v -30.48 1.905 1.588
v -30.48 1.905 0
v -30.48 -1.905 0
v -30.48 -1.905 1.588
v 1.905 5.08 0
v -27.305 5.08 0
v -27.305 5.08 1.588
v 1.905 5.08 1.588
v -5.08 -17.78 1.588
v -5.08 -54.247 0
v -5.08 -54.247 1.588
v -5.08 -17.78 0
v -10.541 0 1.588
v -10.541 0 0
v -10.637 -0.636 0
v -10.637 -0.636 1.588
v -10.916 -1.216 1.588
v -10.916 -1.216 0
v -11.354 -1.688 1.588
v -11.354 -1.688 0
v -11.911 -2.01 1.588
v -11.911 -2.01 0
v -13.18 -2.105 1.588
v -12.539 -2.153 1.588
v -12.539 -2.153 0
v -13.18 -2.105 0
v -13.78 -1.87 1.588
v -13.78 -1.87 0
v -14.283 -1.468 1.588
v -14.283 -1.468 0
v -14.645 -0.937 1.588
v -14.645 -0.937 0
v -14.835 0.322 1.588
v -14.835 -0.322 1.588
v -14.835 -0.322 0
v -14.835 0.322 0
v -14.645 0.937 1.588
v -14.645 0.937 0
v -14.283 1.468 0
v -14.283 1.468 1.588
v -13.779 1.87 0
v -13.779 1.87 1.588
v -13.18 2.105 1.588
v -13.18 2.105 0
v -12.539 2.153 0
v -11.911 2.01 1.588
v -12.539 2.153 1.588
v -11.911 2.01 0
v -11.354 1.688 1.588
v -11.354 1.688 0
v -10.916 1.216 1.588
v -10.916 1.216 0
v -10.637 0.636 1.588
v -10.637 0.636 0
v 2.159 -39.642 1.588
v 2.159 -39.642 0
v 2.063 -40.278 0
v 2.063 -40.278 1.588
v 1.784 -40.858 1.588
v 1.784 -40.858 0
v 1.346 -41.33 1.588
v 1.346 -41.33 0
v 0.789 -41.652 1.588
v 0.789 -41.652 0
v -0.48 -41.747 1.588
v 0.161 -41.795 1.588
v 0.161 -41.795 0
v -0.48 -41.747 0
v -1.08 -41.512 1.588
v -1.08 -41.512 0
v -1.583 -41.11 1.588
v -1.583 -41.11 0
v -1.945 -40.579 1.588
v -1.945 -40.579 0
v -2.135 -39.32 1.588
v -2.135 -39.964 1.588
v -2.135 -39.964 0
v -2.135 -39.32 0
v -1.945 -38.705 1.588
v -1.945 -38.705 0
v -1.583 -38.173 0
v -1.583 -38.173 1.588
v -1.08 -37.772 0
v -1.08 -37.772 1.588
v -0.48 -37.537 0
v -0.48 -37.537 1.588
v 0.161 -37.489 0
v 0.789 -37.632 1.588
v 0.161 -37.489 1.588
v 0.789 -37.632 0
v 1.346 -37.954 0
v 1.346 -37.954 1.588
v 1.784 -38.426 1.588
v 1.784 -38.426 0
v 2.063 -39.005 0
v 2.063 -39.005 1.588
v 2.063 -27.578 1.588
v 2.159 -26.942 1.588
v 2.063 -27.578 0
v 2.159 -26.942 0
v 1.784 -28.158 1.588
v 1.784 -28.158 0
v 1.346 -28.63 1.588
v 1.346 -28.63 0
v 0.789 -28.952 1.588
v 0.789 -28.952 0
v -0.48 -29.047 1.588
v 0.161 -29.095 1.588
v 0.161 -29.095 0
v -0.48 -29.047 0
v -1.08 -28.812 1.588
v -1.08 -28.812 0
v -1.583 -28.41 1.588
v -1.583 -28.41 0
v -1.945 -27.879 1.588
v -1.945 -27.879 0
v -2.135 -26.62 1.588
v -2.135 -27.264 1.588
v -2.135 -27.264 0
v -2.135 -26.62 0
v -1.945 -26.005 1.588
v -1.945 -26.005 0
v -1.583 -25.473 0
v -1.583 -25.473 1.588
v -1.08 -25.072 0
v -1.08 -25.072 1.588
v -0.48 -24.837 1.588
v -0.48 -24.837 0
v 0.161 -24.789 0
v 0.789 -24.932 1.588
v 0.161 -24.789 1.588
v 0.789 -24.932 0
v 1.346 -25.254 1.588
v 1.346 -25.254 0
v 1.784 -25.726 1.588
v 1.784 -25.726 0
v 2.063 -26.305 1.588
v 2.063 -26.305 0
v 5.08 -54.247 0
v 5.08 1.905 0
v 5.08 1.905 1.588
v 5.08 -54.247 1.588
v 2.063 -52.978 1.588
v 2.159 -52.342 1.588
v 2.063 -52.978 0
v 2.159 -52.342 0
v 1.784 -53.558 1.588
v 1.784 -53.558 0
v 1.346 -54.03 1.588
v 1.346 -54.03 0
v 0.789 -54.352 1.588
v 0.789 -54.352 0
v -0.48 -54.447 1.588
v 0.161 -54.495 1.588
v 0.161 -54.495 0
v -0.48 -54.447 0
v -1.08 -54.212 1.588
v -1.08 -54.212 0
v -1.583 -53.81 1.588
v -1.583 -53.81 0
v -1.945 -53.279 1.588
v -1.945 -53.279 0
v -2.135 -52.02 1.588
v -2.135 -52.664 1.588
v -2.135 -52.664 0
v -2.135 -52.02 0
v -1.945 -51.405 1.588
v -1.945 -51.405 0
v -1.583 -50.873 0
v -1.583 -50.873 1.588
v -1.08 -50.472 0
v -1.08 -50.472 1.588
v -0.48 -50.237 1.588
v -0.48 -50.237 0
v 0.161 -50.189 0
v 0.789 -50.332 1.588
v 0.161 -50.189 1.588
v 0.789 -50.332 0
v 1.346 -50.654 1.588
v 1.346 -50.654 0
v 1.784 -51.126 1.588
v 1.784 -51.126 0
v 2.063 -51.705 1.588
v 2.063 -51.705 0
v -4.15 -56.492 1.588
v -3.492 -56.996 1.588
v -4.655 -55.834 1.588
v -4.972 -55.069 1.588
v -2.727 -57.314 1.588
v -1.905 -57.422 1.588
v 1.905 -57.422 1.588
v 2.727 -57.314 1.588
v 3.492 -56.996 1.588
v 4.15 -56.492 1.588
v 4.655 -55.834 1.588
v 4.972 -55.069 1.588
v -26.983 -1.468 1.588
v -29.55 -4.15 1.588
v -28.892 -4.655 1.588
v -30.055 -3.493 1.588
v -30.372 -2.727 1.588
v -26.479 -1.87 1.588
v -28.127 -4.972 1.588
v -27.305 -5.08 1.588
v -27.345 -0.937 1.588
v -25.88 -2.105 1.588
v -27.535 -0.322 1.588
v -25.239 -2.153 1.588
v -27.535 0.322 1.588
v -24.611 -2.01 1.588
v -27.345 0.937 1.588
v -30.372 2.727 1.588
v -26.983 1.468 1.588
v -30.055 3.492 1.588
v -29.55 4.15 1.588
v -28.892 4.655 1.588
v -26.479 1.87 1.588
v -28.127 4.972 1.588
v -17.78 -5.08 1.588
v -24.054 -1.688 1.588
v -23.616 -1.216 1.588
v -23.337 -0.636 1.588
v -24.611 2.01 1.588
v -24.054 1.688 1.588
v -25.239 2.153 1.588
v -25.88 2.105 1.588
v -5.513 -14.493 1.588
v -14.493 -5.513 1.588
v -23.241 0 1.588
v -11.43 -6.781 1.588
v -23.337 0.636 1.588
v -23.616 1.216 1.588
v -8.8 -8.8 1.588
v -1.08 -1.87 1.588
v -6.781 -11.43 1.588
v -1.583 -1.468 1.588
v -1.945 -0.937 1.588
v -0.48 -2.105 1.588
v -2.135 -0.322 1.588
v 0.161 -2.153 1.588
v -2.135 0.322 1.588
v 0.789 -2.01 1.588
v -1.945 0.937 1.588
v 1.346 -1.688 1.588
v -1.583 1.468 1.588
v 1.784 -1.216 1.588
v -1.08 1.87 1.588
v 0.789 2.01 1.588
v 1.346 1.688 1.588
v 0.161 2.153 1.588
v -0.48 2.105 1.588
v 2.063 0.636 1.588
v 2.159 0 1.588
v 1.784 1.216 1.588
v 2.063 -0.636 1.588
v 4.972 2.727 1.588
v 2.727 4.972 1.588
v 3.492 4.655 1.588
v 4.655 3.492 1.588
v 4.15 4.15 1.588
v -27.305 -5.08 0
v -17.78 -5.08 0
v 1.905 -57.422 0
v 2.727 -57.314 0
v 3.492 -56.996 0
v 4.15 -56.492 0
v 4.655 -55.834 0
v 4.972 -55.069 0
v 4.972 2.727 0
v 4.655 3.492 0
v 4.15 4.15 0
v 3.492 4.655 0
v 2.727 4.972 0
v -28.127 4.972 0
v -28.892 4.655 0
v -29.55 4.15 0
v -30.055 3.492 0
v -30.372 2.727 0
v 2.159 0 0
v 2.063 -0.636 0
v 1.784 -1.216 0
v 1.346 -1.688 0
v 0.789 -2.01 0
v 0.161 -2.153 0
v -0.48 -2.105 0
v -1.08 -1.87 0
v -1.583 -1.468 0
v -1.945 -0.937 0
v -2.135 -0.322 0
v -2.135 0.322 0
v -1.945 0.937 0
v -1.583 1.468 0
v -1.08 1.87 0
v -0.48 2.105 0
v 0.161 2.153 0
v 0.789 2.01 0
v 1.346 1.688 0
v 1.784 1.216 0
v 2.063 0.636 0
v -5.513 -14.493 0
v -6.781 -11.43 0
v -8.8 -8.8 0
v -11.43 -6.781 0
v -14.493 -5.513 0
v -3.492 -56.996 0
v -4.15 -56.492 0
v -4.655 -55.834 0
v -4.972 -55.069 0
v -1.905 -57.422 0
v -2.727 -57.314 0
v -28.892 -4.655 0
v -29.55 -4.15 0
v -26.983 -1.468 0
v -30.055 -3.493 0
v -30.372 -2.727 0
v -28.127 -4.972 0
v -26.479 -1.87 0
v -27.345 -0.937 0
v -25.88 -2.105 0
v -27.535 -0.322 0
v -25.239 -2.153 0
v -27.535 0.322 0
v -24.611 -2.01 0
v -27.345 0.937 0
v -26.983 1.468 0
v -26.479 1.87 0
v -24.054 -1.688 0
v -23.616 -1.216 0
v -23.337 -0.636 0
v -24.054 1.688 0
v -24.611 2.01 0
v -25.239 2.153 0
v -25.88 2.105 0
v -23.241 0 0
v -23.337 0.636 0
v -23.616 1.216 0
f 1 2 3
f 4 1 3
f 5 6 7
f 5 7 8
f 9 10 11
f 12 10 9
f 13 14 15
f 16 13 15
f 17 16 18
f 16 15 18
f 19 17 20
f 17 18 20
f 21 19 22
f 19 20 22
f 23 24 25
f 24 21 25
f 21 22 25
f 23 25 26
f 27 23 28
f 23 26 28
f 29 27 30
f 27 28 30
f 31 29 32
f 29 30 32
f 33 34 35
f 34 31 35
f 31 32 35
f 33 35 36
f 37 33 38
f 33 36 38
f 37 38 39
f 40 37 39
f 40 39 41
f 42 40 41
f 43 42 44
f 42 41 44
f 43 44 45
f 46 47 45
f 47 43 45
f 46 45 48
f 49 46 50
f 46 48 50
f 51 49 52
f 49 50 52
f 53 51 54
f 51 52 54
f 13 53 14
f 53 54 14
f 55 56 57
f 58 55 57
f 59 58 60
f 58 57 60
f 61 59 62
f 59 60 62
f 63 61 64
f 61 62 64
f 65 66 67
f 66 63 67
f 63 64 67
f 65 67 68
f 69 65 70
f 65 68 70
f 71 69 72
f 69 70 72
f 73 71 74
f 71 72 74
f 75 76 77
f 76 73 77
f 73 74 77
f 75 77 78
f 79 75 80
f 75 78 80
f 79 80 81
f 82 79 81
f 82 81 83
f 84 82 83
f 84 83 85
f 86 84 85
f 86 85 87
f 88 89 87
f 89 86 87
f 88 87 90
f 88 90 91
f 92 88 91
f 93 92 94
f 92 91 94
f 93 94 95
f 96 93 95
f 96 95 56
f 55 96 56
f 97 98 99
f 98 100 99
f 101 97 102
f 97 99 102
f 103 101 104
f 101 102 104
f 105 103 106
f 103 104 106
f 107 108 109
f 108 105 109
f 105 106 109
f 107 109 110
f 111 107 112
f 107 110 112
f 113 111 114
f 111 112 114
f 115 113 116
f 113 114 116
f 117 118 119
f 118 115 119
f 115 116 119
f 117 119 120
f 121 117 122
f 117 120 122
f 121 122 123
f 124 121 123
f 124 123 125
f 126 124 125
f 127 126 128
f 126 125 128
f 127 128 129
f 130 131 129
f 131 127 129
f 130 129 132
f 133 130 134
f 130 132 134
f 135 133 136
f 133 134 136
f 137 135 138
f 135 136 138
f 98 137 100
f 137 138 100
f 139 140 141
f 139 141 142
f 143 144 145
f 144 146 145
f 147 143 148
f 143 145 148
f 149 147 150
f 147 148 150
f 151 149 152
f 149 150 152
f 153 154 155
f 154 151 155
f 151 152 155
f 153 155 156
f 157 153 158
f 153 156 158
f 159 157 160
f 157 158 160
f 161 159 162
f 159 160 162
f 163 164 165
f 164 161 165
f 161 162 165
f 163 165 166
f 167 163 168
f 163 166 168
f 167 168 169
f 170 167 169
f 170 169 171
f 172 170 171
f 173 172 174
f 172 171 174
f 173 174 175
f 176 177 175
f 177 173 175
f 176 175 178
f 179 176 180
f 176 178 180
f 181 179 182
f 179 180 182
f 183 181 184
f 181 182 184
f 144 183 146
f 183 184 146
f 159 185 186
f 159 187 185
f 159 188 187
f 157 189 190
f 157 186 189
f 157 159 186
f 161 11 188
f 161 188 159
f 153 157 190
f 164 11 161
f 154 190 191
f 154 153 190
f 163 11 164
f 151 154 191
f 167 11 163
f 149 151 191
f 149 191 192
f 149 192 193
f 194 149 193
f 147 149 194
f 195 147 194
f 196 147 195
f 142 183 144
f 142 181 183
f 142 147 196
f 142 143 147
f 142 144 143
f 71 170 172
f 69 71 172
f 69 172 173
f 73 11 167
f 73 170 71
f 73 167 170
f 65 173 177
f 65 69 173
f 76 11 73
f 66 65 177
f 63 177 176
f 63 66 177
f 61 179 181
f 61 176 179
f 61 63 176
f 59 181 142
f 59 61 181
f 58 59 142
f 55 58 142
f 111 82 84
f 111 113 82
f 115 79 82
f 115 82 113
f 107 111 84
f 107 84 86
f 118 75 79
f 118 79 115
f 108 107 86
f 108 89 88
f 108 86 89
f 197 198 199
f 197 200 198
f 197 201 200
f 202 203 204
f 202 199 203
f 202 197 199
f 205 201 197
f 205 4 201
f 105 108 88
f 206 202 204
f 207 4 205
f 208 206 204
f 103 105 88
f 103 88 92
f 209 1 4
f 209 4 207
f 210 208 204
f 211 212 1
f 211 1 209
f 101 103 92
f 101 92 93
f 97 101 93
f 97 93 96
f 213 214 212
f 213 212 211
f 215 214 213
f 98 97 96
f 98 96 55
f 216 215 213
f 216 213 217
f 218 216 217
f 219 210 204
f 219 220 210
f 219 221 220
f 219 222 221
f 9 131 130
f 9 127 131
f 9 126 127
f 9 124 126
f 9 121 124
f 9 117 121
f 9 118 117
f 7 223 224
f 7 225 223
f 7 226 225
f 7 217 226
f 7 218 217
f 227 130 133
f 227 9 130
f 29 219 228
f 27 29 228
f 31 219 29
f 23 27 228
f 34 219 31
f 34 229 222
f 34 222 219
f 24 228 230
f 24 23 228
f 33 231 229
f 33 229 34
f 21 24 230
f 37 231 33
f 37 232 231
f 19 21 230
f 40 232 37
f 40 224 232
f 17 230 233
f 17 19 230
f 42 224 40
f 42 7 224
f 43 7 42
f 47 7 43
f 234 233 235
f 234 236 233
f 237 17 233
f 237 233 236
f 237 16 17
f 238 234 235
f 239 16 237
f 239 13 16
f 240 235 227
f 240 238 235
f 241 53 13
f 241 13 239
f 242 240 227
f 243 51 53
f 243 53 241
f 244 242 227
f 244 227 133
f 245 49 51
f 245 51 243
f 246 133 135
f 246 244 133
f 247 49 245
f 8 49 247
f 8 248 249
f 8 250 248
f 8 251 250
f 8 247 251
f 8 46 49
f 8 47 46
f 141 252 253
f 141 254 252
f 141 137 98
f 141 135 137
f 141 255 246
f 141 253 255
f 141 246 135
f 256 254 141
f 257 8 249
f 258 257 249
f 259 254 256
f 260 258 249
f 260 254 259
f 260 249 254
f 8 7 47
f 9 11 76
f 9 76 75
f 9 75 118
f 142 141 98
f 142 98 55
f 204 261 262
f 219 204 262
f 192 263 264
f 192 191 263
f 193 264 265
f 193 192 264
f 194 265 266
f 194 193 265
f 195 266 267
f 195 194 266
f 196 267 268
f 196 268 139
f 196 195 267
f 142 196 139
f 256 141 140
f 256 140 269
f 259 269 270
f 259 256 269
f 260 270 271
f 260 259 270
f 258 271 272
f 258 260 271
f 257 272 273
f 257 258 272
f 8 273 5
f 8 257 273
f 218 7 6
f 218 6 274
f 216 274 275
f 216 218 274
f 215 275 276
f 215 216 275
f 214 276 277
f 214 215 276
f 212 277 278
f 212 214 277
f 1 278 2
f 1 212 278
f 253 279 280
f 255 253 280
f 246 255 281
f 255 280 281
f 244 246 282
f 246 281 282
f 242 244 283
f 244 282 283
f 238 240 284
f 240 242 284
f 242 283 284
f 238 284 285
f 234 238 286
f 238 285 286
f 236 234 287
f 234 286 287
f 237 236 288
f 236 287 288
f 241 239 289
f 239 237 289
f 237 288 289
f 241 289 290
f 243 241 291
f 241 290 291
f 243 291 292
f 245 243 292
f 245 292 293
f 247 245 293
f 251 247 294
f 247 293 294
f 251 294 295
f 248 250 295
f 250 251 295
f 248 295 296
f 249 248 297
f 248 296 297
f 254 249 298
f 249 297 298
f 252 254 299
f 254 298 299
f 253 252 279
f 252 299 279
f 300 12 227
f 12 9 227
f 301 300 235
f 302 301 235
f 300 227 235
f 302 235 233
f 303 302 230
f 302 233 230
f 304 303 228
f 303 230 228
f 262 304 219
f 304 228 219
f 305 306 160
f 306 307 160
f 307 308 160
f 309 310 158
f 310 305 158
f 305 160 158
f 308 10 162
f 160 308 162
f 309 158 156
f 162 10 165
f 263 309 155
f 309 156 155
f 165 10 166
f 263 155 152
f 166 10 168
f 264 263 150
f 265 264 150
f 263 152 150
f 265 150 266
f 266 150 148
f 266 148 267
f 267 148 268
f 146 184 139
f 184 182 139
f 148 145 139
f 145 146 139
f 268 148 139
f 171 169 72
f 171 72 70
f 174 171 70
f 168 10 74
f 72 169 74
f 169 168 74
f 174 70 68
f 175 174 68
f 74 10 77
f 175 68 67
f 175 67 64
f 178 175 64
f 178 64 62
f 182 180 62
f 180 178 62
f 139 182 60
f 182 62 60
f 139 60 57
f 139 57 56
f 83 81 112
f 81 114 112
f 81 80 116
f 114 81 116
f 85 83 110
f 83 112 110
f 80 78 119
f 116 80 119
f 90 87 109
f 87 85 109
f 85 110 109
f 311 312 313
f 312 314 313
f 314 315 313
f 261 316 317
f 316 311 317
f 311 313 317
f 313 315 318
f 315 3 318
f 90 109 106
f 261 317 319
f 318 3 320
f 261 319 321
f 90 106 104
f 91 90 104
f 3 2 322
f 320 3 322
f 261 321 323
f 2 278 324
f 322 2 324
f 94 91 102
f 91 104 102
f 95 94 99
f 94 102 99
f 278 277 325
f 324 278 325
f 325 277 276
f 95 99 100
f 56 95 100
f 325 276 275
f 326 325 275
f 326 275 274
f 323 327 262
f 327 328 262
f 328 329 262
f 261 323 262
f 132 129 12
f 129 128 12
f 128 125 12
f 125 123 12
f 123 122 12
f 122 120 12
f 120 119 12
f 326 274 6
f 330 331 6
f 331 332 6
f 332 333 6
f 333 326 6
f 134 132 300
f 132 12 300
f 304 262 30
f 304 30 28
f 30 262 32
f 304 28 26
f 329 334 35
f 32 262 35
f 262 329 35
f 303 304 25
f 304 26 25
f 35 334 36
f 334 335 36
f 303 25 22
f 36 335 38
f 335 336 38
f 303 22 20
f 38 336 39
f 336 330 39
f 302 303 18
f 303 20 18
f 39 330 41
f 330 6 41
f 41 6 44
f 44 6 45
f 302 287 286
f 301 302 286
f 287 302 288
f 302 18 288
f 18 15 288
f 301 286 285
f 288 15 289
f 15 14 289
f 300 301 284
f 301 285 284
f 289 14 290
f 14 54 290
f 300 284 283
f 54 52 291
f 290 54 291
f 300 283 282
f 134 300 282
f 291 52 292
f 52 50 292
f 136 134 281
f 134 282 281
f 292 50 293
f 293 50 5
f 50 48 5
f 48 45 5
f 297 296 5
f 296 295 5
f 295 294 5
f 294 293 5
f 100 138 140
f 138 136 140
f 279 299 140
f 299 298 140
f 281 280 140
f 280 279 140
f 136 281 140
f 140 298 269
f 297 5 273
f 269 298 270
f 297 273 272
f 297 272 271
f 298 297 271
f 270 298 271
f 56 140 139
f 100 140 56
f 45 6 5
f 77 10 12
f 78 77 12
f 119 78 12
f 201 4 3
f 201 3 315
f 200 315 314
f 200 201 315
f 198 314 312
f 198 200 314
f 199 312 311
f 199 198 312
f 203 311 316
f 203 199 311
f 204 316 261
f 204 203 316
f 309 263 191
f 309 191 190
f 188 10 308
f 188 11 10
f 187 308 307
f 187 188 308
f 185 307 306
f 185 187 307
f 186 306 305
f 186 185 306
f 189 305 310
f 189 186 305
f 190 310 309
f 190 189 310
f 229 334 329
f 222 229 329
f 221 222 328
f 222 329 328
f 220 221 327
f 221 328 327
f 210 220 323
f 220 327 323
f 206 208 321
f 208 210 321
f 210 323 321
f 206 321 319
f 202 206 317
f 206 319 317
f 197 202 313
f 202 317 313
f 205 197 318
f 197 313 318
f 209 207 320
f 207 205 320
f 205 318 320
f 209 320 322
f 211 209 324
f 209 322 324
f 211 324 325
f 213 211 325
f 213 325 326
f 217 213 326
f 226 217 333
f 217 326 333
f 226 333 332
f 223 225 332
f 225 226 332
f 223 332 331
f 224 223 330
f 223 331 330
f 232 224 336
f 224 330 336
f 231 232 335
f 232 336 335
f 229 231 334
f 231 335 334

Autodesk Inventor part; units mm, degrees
ref_plane "YZ Plane" through (0, 0, 0) normal (1, 0, 0) x (0, 1, 0)
ref_plane "XZ Plane" through (0, 0, 0) normal (0, 1, 0) x (-1, 0, 0)
ref_plane "XY Plane" through (0, 0, 0) normal (0, 0, 1) x (1, 0, 0)
sketch "Sketch1" plane through (0, 0, 0) normal (0, 0, 1) x (1, 0, 0)
  circle A0 centre (0, 0) radius 2.159
  line L0 (0, 0) -> (-38.1, 0) construction
  line L1 (0, 0) -> (0, -26.9418) construction
  circle A1 centre (-12.7, 0) radius 2.159
  circle A2 centre (-25.4, 0) radius 2.159
  circle A3 centre (0, -26.9418) radius 2.159
  circle A4 centre (0, -39.6418) radius 2.159
  circle A5 centre (0, -52.3418) radius 2.159
  line L2 (5.08, -57.4218) -> (-5.08, -57.4218)
  line L3 (-5.08, -57.4218) -> (-5.08, 5.08)
  line L4 (-5.08, 5.08) -> (5.08, 5.08)
  line L5 (5.08, 5.08) -> (5.08, -57.4218)
  circle A6 centre (0, -52.3418) radius 5.08 construction
  circle A7 centre (0, 0) radius 5.08 construction
  line L6 (5.08, 5.08) -> (-30.48, 5.08)
  line L7 (-30.48, 5.08) -> (-30.48, -5.08)
  line L8 (-30.48, -5.08) -> (5.08, -5.08)
  line L9 (5.08, -5.08) -> (5.08, 5.08)
  circle A8 centre (-25.4, 0) radius 5.08 construction
  point P0 (-5.08, 5.08)
  point P1 (-5.08, -5.08)
  point P2 (-5.08, 5.08)
  point P3 (5.08, -5.08)
  dimension "d5" = 12.7
  dimension "d21" = 26.9418
  dimension "d22" = 4.318
  dimension "d25" = 12.7
  dimension "d30" = 10.16
extrude "Extrusion1" add sketch "Sketch1" along normal blind 1.5875
fillet "Fillet1" radius 3.175 5 edges at (-30.48, -5.08, 0.7937) (-30.48, 5.08, 0.7937) (5.08, 5.08, 0.7937) (5.08, -57.4218, 0.7937) (-5.08, -57.4218, 0.7937)
fillet "Fillet2" radius 12.7 1 edges at (-5.08, -5.08, 0.7937)
properties part number "Inner_Strut_Gusset" material "Aluminum 6061"
